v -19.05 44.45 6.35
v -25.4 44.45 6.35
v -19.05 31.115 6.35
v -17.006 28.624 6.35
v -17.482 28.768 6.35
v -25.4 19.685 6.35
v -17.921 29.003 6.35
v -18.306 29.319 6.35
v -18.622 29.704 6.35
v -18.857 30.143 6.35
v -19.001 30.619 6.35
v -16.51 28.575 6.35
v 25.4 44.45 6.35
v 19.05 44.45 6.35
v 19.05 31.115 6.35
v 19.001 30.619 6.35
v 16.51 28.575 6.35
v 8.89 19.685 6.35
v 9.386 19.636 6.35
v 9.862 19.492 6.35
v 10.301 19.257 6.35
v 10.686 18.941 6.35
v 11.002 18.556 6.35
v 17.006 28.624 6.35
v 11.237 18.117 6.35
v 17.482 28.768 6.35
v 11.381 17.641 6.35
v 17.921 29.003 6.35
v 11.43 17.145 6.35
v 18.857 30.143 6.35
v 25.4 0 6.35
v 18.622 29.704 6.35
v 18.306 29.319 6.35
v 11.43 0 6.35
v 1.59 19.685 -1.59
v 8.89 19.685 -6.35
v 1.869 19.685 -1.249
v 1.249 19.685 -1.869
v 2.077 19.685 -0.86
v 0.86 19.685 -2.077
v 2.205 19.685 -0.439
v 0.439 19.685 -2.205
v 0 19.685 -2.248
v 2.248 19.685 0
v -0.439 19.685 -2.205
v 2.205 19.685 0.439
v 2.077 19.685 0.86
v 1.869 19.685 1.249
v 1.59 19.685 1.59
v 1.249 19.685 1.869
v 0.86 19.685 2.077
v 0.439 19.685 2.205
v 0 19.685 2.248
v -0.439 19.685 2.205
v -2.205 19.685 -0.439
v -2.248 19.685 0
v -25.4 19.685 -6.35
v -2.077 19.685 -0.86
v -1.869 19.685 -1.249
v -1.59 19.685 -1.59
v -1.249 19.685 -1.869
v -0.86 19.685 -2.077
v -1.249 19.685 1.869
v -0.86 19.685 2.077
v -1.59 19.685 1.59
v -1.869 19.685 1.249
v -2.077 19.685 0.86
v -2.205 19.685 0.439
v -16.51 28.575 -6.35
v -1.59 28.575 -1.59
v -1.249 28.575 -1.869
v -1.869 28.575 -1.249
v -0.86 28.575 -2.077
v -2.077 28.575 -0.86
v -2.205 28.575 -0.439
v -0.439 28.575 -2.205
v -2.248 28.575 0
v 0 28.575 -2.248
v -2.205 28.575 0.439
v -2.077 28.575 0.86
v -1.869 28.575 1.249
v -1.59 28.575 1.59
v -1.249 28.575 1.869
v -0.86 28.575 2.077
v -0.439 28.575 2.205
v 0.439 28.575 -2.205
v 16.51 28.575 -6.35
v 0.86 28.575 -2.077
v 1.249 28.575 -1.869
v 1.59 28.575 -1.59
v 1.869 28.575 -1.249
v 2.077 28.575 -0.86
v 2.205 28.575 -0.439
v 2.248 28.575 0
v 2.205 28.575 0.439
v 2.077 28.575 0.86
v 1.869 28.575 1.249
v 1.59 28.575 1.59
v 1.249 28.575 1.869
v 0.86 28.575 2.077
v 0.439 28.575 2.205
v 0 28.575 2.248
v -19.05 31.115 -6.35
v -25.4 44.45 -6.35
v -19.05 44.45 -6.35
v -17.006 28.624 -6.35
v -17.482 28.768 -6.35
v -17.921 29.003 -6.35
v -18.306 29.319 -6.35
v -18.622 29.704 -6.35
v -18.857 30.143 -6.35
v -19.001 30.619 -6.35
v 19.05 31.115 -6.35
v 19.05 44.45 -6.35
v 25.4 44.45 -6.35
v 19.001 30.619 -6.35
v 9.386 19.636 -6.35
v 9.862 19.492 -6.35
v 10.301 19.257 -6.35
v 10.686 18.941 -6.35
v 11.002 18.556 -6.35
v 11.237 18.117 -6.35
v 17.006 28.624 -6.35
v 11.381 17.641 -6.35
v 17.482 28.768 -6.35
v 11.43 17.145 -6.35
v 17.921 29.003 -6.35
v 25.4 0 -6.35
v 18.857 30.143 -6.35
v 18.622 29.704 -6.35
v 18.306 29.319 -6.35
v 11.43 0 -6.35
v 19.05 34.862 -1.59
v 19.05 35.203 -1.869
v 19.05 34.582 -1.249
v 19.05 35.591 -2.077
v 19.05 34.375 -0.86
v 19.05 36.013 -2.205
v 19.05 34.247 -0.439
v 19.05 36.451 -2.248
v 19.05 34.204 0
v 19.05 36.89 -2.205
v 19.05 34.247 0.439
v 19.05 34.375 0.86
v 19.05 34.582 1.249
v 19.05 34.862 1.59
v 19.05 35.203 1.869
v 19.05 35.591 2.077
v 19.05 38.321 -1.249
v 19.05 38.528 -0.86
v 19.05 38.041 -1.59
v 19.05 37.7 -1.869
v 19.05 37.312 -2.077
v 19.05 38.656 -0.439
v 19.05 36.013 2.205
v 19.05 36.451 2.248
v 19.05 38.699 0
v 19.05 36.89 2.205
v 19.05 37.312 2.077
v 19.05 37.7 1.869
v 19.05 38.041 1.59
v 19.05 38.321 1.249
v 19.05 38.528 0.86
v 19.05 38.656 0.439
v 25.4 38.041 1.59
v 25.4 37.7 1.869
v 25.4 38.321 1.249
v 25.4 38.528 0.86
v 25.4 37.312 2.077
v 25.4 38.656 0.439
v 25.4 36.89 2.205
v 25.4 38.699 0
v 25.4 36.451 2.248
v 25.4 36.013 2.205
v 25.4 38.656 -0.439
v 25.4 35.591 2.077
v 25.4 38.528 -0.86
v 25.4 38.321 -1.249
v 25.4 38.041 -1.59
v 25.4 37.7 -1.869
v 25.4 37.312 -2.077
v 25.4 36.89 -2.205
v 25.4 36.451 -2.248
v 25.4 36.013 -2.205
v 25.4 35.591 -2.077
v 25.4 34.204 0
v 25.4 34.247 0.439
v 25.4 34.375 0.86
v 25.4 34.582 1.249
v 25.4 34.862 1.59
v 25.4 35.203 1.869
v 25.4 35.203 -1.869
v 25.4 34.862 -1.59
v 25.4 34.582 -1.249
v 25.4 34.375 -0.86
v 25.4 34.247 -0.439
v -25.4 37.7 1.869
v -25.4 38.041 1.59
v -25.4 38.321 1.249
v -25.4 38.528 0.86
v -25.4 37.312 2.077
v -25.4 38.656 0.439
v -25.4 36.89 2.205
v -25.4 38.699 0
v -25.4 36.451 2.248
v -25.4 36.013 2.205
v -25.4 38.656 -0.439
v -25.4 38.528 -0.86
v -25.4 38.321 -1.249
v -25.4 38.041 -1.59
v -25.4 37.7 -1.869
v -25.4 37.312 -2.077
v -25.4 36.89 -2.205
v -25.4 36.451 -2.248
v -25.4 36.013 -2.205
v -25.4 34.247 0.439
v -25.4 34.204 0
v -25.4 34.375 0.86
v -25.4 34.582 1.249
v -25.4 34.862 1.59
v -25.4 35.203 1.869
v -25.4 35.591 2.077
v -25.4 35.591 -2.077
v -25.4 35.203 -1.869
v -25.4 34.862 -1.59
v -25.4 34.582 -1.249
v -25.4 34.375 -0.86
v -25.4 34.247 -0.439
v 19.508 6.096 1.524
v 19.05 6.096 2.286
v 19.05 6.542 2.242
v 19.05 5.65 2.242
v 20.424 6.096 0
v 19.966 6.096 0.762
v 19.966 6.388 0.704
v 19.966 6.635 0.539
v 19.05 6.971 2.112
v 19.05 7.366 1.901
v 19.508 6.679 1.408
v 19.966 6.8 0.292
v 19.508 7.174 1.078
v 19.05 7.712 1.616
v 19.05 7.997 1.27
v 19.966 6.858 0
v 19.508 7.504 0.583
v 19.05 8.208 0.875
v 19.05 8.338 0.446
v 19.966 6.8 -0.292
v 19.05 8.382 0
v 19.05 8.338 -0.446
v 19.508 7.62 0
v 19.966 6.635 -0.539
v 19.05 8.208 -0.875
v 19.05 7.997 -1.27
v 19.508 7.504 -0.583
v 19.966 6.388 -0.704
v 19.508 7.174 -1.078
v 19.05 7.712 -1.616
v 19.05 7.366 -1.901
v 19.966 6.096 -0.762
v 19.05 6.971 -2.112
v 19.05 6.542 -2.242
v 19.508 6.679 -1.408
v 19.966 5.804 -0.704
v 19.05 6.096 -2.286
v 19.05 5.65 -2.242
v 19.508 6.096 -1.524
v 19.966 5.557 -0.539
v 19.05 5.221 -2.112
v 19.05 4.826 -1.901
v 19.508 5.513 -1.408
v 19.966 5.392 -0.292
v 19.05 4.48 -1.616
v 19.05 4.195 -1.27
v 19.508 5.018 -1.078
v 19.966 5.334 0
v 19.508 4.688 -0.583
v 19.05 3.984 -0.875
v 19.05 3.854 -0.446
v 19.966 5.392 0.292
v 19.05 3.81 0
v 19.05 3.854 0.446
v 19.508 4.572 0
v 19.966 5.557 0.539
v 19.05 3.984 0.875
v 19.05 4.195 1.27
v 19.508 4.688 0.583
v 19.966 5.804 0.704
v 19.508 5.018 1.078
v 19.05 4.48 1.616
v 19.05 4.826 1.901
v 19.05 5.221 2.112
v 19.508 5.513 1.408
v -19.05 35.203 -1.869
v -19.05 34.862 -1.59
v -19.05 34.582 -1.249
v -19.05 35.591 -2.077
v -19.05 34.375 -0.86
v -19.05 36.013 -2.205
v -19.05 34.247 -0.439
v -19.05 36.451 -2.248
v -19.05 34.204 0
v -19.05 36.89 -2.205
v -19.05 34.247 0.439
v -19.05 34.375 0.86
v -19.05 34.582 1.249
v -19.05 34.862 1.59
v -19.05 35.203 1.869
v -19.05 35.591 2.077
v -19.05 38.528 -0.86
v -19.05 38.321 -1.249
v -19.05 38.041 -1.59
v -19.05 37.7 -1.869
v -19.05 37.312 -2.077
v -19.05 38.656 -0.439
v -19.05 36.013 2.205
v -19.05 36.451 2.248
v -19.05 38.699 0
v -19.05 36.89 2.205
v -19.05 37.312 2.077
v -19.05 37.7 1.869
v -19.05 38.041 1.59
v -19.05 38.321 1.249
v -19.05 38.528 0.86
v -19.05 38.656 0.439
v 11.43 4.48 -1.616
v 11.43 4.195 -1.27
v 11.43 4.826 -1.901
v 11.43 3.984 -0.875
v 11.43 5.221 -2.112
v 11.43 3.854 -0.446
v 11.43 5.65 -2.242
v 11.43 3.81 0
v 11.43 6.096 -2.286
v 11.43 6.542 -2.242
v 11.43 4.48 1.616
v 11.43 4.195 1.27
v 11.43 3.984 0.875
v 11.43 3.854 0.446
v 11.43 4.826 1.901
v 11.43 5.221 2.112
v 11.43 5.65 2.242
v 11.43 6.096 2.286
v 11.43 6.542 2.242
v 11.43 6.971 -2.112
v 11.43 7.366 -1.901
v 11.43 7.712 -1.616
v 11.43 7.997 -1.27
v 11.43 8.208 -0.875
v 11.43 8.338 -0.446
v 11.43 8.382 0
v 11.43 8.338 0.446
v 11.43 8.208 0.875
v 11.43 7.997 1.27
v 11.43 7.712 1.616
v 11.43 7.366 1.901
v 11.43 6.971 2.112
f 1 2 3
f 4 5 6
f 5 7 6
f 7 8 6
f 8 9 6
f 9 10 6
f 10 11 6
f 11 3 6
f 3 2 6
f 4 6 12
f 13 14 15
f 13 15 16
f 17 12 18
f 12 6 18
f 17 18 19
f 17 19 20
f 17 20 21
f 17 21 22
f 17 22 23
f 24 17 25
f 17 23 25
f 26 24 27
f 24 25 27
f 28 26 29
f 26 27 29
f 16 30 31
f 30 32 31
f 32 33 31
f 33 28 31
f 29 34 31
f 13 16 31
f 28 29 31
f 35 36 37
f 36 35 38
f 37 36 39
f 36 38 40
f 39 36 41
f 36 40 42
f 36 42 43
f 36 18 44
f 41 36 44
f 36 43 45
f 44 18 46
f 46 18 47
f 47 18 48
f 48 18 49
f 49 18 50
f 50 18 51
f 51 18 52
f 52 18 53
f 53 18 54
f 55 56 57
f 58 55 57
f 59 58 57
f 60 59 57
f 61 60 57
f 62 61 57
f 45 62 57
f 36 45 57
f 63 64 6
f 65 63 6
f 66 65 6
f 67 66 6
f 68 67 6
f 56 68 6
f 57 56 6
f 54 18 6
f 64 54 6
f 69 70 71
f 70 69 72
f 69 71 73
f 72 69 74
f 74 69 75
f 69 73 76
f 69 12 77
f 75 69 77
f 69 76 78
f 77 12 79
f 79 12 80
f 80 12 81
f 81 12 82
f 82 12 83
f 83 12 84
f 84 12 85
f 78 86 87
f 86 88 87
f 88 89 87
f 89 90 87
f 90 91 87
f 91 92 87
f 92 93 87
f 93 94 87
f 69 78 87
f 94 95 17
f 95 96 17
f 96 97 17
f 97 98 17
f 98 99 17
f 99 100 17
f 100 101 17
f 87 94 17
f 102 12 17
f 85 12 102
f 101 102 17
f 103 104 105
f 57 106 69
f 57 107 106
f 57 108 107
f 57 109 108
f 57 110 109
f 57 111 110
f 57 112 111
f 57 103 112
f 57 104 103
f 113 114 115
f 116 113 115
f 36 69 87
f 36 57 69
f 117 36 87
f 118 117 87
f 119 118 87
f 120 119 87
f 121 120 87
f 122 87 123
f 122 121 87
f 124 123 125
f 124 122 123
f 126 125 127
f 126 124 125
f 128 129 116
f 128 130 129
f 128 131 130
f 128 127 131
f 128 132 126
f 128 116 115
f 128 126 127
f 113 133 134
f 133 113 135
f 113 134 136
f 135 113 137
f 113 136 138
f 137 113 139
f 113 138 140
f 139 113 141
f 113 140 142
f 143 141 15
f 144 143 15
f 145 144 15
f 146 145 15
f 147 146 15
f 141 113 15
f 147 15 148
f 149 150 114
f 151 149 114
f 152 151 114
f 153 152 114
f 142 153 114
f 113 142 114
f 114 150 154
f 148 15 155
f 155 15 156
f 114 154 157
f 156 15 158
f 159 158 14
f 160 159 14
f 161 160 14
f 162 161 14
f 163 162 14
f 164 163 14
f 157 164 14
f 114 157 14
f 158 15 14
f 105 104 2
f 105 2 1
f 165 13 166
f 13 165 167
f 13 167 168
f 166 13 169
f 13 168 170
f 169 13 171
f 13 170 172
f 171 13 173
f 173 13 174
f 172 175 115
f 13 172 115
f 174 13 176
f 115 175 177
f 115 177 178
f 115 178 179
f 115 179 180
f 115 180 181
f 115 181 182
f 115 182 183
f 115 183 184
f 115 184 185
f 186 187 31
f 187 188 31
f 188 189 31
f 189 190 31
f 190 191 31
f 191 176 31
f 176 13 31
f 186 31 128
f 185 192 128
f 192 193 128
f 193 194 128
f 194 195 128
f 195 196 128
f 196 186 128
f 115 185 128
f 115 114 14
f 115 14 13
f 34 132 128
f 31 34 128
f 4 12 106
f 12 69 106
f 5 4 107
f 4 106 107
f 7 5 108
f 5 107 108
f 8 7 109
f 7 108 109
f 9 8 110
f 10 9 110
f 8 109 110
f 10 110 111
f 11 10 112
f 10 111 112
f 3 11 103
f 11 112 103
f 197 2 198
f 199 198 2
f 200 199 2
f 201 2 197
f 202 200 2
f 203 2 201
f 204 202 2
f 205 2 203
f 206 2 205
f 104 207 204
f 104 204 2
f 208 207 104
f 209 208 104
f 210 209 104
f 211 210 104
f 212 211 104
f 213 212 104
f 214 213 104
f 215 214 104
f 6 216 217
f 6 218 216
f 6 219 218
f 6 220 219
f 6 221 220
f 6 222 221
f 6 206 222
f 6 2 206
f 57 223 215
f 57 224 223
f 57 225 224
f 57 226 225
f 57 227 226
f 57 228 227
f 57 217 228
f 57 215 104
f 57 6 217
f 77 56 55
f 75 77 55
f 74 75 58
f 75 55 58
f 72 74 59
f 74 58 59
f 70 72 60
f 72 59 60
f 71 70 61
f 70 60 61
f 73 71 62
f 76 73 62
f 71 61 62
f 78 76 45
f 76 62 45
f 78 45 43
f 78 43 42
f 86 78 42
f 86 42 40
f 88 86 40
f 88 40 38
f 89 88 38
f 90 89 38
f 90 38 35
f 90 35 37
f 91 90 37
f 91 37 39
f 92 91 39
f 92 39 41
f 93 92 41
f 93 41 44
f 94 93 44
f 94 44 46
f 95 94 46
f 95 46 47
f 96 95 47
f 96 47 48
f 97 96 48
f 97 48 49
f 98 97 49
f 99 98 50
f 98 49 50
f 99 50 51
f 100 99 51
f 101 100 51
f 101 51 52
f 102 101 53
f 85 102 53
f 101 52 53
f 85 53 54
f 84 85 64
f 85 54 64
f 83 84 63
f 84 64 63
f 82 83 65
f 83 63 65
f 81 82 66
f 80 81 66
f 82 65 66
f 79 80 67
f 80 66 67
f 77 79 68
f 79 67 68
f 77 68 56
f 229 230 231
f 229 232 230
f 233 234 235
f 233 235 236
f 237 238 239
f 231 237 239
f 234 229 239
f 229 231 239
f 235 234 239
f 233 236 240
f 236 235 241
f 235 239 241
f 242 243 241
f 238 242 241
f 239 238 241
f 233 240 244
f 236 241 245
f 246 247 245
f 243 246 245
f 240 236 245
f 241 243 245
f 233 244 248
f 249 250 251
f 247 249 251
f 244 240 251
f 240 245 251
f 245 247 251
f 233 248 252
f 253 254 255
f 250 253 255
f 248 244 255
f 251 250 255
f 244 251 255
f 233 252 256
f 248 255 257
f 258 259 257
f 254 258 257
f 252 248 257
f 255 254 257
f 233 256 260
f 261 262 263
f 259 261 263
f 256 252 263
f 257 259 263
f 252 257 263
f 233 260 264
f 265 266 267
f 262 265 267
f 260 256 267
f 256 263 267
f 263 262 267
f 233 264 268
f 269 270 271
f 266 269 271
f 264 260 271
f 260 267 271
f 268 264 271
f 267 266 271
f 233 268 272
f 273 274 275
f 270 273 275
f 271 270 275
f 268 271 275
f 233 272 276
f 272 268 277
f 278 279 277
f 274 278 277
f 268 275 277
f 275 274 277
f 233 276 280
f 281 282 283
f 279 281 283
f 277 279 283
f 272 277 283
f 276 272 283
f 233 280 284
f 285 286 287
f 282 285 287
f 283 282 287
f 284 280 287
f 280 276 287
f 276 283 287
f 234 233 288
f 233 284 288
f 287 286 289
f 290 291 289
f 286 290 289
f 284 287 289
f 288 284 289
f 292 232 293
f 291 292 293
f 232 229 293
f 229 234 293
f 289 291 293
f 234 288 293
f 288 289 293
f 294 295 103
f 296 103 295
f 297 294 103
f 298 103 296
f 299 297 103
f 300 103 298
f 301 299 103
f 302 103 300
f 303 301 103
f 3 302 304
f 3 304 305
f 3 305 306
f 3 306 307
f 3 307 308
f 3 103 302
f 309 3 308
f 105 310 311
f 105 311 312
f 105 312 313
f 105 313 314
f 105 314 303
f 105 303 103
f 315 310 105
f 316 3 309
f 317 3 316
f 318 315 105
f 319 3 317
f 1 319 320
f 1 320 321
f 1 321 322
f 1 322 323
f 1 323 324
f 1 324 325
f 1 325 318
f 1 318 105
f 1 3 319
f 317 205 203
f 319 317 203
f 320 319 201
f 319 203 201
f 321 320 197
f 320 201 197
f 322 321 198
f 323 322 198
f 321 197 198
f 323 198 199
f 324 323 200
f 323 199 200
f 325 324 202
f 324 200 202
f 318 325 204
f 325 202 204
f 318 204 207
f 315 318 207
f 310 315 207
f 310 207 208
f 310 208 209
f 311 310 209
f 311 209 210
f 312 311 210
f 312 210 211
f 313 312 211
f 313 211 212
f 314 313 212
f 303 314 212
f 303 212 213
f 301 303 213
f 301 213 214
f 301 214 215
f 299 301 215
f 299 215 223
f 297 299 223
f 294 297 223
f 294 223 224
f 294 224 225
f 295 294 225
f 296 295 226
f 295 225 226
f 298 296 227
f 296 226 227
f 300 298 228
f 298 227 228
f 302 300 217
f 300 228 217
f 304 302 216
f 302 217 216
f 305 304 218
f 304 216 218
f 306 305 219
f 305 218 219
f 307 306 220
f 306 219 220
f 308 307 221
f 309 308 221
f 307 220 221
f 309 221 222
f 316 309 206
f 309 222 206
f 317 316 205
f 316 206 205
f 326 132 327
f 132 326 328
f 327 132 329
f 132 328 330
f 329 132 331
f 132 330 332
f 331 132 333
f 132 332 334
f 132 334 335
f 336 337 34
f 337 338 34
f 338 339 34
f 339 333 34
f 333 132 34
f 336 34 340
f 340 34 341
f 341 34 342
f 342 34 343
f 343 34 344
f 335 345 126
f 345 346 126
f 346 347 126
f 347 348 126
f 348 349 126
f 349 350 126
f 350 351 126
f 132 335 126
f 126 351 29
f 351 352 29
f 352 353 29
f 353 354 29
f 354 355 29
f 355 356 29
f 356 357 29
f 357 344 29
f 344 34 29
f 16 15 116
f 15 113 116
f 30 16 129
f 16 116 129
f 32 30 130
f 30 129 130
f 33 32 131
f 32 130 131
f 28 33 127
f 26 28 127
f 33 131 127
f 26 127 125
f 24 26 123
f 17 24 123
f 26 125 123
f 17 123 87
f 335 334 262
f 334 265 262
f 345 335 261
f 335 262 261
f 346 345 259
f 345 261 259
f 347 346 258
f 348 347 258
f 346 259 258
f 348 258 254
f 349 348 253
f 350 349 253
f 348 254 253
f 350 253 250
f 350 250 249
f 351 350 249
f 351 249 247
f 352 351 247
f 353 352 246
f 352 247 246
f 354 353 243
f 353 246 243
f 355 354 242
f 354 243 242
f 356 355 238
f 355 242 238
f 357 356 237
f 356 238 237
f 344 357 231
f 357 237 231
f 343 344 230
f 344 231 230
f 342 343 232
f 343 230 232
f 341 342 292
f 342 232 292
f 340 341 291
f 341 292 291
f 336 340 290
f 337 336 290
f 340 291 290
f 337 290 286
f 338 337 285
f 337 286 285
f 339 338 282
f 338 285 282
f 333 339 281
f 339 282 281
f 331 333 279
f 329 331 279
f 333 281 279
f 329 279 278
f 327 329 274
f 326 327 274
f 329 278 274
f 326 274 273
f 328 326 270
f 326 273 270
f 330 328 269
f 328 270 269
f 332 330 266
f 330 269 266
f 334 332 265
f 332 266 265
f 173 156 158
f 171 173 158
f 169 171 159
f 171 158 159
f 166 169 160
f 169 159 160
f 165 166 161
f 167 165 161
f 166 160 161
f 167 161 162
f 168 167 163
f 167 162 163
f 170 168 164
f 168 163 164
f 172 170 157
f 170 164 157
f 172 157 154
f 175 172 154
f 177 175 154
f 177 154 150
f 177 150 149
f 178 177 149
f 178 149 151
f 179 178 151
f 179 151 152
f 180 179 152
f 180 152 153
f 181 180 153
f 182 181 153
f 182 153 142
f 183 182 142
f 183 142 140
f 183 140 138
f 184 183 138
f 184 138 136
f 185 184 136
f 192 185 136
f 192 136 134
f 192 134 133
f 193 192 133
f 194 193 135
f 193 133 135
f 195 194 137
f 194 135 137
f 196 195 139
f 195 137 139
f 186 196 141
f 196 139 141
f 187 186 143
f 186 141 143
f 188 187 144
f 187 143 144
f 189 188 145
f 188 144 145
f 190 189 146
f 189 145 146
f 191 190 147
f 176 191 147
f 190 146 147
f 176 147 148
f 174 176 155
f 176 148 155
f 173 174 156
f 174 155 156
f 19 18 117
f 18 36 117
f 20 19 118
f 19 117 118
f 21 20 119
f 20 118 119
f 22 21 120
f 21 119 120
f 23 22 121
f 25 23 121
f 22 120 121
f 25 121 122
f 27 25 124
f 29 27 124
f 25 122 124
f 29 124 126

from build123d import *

# Parameters (mm, degrees)
SKETCH1_W                    = 50.8
SKETCH1_H                    = 12.7
BOSS_EXTRUDE1_DEPTH          = 44.45
SKETCH8_W                    = 13.97
SKETCH8_H                    = 19.685
SKETCH8_W_2                  = 22.86
SKETCH8_W_3                  = 38.1
SKETCH8_H_2                  = 15.875
CUT_EXTRUDE1_DEPTH           = 53.74706153
F_8_CLEARANCE_HOLE3_D        = 4.4958
F_8_CLEARANCE_HOLE2_D        = 4.4958
F_1_8_0_18_DOWEL_HOLE1_D     = 4.572
F_1_8_0_18_DOWEL_HOLE1_DEPTH = 7.62
F_1_8_0_18_DOWEL_HOLE1_TIP   = 1.373567375
FILLET1_R                    = 2.54


with BuildPart() as part:
    # Sketch1 → Boss-Extrude1 (new body)
    with BuildSketch(Plane(origin=(0, 0, 0), x_dir=(1, 0, 0), z_dir=(0, 1, 0))):
        Rectangle(SKETCH1_W, SKETCH1_H)
    extrude(amount=BOSS_EXTRUDE1_DEPTH)

    # Sketch8 → Cut-Extrude1 (cut, through all)
    with BuildSketch(Plane.XY.offset(6.35)):
        with Locations((-18.415, 9.8425)):
            Rectangle(SKETCH8_W, SKETCH8_H)
        with Locations((0, 9.8425)):
            Rectangle(SKETCH8_W_2, SKETCH8_H)
        with Locations((0, 36.5125)):
            Rectangle(SKETCH8_W_3, SKETCH8_H_2)
    extrude(amount=-CUT_EXTRUDE1_DEPTH, mode=Mode.SUBTRACT)

    # #8 Clearance Hole3 (through all)
    with Locations(Plane(origin=(25.4, 0, 0), x_dir=(0, 0, -1), z_dir=(1, 0, 0))):
        with Locations((0, 36.451492413)):
            Hole(F_8_CLEARANCE_HOLE3_D / 2)

    # #8 Clearance Hole2 (through all)
    with Locations(Plane(origin=(0, 28.575, 0), x_dir=(1, 0, 0), z_dir=(0, 1, 0))):
        with Locations((0, 0)):
            Hole(F_8_CLEARANCE_HOLE2_D / 2)

    # 1/8 (0.18) Dowel Hole1
    with Locations(Plane.ZY.offset(-11.43)):
        with Locations((0, 6.096)):
            Hole(F_1_8_0_18_DOWEL_HOLE1_D / 2, depth=F_1_8_0_18_DOWEL_HOLE1_DEPTH)
            with Locations((0, 0, -(F_1_8_0_18_DOWEL_HOLE1_DEPTH + F_1_8_0_18_DOWEL_HOLE1_TIP / 2))):  # 118° drill point
                Cone(0, F_1_8_0_18_DOWEL_HOLE1_D / 2, F_1_8_0_18_DOWEL_HOLE1_TIP, mode=Mode.SUBTRACT)

    # Fillet1
    fillet1_edges = [part.edges().sort_by_distance(p)[0] for p in [
        (11.43, 19.685, 0),
        (19.05, 28.575, 0),
        (-19.05, 28.575, 0),
    ]]
    fillet(fillet1_edges, radius=FILLET1_R)


solid = part.part
